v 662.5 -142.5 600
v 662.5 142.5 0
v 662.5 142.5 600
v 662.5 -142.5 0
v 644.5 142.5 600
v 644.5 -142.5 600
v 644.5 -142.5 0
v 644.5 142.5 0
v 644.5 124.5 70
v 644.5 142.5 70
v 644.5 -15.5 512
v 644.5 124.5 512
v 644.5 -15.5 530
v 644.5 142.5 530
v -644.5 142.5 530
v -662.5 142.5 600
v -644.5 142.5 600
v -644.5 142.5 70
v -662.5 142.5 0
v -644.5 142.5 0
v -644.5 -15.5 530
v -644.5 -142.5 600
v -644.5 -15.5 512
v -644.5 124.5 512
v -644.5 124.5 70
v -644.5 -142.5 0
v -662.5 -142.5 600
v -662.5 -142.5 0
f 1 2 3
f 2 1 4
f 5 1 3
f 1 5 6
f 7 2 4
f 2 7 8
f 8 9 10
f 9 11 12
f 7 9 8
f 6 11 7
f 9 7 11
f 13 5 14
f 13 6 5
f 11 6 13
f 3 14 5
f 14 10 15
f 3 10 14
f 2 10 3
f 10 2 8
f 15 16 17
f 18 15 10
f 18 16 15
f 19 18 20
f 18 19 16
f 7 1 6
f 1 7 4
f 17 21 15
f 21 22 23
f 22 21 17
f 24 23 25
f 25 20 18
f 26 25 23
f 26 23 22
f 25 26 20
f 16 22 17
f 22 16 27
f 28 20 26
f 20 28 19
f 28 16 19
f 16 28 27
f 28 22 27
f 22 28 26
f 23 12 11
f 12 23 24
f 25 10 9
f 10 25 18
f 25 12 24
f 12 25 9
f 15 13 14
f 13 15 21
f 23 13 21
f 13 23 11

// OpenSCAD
piano_length = 1325; // This matters so that the edges are flush
piano_depth = 285; // This unfortunately matters, will mean cutting 15mm off a 300mm board
piano_height = 600;
board_thickness = 18;
pedal_allowance = 70;
piano_allowance = 70; // 5mm tolerance is ok here
back_height = piano_height - piano_allowance - pedal_allowance - board_thickness;
back_length = piano_length - 2 * board_thickness;
support_width = 600 - back_height; // Wood width is 600

module wood(w, h, d) {
    cube(size=[w, h, d], center=true);
    echo("Wood: ", w, h, d);
}

translate([(piano_length - board_thickness) * 0.5, 0, piano_height * 0.5]) {
    wood(board_thickness, piano_depth, piano_height);
}
translate([-(piano_length - board_thickness) * 0.5, 0, piano_height * 0.5]) {
    wood(board_thickness, piano_depth, piano_height);
}
translate([0, piano_depth * 0.5 - board_thickness * 0.5, pedal_allowance + back_height * 0.5]) {
    wood(back_length, board_thickness, back_height);
}
translate([0, piano_depth * 0.5 - support_width * 0.5, piano_height - piano_allowance - board_thickness * 0.5]) {
    wood(back_length, support_width, board_thickness);
}
